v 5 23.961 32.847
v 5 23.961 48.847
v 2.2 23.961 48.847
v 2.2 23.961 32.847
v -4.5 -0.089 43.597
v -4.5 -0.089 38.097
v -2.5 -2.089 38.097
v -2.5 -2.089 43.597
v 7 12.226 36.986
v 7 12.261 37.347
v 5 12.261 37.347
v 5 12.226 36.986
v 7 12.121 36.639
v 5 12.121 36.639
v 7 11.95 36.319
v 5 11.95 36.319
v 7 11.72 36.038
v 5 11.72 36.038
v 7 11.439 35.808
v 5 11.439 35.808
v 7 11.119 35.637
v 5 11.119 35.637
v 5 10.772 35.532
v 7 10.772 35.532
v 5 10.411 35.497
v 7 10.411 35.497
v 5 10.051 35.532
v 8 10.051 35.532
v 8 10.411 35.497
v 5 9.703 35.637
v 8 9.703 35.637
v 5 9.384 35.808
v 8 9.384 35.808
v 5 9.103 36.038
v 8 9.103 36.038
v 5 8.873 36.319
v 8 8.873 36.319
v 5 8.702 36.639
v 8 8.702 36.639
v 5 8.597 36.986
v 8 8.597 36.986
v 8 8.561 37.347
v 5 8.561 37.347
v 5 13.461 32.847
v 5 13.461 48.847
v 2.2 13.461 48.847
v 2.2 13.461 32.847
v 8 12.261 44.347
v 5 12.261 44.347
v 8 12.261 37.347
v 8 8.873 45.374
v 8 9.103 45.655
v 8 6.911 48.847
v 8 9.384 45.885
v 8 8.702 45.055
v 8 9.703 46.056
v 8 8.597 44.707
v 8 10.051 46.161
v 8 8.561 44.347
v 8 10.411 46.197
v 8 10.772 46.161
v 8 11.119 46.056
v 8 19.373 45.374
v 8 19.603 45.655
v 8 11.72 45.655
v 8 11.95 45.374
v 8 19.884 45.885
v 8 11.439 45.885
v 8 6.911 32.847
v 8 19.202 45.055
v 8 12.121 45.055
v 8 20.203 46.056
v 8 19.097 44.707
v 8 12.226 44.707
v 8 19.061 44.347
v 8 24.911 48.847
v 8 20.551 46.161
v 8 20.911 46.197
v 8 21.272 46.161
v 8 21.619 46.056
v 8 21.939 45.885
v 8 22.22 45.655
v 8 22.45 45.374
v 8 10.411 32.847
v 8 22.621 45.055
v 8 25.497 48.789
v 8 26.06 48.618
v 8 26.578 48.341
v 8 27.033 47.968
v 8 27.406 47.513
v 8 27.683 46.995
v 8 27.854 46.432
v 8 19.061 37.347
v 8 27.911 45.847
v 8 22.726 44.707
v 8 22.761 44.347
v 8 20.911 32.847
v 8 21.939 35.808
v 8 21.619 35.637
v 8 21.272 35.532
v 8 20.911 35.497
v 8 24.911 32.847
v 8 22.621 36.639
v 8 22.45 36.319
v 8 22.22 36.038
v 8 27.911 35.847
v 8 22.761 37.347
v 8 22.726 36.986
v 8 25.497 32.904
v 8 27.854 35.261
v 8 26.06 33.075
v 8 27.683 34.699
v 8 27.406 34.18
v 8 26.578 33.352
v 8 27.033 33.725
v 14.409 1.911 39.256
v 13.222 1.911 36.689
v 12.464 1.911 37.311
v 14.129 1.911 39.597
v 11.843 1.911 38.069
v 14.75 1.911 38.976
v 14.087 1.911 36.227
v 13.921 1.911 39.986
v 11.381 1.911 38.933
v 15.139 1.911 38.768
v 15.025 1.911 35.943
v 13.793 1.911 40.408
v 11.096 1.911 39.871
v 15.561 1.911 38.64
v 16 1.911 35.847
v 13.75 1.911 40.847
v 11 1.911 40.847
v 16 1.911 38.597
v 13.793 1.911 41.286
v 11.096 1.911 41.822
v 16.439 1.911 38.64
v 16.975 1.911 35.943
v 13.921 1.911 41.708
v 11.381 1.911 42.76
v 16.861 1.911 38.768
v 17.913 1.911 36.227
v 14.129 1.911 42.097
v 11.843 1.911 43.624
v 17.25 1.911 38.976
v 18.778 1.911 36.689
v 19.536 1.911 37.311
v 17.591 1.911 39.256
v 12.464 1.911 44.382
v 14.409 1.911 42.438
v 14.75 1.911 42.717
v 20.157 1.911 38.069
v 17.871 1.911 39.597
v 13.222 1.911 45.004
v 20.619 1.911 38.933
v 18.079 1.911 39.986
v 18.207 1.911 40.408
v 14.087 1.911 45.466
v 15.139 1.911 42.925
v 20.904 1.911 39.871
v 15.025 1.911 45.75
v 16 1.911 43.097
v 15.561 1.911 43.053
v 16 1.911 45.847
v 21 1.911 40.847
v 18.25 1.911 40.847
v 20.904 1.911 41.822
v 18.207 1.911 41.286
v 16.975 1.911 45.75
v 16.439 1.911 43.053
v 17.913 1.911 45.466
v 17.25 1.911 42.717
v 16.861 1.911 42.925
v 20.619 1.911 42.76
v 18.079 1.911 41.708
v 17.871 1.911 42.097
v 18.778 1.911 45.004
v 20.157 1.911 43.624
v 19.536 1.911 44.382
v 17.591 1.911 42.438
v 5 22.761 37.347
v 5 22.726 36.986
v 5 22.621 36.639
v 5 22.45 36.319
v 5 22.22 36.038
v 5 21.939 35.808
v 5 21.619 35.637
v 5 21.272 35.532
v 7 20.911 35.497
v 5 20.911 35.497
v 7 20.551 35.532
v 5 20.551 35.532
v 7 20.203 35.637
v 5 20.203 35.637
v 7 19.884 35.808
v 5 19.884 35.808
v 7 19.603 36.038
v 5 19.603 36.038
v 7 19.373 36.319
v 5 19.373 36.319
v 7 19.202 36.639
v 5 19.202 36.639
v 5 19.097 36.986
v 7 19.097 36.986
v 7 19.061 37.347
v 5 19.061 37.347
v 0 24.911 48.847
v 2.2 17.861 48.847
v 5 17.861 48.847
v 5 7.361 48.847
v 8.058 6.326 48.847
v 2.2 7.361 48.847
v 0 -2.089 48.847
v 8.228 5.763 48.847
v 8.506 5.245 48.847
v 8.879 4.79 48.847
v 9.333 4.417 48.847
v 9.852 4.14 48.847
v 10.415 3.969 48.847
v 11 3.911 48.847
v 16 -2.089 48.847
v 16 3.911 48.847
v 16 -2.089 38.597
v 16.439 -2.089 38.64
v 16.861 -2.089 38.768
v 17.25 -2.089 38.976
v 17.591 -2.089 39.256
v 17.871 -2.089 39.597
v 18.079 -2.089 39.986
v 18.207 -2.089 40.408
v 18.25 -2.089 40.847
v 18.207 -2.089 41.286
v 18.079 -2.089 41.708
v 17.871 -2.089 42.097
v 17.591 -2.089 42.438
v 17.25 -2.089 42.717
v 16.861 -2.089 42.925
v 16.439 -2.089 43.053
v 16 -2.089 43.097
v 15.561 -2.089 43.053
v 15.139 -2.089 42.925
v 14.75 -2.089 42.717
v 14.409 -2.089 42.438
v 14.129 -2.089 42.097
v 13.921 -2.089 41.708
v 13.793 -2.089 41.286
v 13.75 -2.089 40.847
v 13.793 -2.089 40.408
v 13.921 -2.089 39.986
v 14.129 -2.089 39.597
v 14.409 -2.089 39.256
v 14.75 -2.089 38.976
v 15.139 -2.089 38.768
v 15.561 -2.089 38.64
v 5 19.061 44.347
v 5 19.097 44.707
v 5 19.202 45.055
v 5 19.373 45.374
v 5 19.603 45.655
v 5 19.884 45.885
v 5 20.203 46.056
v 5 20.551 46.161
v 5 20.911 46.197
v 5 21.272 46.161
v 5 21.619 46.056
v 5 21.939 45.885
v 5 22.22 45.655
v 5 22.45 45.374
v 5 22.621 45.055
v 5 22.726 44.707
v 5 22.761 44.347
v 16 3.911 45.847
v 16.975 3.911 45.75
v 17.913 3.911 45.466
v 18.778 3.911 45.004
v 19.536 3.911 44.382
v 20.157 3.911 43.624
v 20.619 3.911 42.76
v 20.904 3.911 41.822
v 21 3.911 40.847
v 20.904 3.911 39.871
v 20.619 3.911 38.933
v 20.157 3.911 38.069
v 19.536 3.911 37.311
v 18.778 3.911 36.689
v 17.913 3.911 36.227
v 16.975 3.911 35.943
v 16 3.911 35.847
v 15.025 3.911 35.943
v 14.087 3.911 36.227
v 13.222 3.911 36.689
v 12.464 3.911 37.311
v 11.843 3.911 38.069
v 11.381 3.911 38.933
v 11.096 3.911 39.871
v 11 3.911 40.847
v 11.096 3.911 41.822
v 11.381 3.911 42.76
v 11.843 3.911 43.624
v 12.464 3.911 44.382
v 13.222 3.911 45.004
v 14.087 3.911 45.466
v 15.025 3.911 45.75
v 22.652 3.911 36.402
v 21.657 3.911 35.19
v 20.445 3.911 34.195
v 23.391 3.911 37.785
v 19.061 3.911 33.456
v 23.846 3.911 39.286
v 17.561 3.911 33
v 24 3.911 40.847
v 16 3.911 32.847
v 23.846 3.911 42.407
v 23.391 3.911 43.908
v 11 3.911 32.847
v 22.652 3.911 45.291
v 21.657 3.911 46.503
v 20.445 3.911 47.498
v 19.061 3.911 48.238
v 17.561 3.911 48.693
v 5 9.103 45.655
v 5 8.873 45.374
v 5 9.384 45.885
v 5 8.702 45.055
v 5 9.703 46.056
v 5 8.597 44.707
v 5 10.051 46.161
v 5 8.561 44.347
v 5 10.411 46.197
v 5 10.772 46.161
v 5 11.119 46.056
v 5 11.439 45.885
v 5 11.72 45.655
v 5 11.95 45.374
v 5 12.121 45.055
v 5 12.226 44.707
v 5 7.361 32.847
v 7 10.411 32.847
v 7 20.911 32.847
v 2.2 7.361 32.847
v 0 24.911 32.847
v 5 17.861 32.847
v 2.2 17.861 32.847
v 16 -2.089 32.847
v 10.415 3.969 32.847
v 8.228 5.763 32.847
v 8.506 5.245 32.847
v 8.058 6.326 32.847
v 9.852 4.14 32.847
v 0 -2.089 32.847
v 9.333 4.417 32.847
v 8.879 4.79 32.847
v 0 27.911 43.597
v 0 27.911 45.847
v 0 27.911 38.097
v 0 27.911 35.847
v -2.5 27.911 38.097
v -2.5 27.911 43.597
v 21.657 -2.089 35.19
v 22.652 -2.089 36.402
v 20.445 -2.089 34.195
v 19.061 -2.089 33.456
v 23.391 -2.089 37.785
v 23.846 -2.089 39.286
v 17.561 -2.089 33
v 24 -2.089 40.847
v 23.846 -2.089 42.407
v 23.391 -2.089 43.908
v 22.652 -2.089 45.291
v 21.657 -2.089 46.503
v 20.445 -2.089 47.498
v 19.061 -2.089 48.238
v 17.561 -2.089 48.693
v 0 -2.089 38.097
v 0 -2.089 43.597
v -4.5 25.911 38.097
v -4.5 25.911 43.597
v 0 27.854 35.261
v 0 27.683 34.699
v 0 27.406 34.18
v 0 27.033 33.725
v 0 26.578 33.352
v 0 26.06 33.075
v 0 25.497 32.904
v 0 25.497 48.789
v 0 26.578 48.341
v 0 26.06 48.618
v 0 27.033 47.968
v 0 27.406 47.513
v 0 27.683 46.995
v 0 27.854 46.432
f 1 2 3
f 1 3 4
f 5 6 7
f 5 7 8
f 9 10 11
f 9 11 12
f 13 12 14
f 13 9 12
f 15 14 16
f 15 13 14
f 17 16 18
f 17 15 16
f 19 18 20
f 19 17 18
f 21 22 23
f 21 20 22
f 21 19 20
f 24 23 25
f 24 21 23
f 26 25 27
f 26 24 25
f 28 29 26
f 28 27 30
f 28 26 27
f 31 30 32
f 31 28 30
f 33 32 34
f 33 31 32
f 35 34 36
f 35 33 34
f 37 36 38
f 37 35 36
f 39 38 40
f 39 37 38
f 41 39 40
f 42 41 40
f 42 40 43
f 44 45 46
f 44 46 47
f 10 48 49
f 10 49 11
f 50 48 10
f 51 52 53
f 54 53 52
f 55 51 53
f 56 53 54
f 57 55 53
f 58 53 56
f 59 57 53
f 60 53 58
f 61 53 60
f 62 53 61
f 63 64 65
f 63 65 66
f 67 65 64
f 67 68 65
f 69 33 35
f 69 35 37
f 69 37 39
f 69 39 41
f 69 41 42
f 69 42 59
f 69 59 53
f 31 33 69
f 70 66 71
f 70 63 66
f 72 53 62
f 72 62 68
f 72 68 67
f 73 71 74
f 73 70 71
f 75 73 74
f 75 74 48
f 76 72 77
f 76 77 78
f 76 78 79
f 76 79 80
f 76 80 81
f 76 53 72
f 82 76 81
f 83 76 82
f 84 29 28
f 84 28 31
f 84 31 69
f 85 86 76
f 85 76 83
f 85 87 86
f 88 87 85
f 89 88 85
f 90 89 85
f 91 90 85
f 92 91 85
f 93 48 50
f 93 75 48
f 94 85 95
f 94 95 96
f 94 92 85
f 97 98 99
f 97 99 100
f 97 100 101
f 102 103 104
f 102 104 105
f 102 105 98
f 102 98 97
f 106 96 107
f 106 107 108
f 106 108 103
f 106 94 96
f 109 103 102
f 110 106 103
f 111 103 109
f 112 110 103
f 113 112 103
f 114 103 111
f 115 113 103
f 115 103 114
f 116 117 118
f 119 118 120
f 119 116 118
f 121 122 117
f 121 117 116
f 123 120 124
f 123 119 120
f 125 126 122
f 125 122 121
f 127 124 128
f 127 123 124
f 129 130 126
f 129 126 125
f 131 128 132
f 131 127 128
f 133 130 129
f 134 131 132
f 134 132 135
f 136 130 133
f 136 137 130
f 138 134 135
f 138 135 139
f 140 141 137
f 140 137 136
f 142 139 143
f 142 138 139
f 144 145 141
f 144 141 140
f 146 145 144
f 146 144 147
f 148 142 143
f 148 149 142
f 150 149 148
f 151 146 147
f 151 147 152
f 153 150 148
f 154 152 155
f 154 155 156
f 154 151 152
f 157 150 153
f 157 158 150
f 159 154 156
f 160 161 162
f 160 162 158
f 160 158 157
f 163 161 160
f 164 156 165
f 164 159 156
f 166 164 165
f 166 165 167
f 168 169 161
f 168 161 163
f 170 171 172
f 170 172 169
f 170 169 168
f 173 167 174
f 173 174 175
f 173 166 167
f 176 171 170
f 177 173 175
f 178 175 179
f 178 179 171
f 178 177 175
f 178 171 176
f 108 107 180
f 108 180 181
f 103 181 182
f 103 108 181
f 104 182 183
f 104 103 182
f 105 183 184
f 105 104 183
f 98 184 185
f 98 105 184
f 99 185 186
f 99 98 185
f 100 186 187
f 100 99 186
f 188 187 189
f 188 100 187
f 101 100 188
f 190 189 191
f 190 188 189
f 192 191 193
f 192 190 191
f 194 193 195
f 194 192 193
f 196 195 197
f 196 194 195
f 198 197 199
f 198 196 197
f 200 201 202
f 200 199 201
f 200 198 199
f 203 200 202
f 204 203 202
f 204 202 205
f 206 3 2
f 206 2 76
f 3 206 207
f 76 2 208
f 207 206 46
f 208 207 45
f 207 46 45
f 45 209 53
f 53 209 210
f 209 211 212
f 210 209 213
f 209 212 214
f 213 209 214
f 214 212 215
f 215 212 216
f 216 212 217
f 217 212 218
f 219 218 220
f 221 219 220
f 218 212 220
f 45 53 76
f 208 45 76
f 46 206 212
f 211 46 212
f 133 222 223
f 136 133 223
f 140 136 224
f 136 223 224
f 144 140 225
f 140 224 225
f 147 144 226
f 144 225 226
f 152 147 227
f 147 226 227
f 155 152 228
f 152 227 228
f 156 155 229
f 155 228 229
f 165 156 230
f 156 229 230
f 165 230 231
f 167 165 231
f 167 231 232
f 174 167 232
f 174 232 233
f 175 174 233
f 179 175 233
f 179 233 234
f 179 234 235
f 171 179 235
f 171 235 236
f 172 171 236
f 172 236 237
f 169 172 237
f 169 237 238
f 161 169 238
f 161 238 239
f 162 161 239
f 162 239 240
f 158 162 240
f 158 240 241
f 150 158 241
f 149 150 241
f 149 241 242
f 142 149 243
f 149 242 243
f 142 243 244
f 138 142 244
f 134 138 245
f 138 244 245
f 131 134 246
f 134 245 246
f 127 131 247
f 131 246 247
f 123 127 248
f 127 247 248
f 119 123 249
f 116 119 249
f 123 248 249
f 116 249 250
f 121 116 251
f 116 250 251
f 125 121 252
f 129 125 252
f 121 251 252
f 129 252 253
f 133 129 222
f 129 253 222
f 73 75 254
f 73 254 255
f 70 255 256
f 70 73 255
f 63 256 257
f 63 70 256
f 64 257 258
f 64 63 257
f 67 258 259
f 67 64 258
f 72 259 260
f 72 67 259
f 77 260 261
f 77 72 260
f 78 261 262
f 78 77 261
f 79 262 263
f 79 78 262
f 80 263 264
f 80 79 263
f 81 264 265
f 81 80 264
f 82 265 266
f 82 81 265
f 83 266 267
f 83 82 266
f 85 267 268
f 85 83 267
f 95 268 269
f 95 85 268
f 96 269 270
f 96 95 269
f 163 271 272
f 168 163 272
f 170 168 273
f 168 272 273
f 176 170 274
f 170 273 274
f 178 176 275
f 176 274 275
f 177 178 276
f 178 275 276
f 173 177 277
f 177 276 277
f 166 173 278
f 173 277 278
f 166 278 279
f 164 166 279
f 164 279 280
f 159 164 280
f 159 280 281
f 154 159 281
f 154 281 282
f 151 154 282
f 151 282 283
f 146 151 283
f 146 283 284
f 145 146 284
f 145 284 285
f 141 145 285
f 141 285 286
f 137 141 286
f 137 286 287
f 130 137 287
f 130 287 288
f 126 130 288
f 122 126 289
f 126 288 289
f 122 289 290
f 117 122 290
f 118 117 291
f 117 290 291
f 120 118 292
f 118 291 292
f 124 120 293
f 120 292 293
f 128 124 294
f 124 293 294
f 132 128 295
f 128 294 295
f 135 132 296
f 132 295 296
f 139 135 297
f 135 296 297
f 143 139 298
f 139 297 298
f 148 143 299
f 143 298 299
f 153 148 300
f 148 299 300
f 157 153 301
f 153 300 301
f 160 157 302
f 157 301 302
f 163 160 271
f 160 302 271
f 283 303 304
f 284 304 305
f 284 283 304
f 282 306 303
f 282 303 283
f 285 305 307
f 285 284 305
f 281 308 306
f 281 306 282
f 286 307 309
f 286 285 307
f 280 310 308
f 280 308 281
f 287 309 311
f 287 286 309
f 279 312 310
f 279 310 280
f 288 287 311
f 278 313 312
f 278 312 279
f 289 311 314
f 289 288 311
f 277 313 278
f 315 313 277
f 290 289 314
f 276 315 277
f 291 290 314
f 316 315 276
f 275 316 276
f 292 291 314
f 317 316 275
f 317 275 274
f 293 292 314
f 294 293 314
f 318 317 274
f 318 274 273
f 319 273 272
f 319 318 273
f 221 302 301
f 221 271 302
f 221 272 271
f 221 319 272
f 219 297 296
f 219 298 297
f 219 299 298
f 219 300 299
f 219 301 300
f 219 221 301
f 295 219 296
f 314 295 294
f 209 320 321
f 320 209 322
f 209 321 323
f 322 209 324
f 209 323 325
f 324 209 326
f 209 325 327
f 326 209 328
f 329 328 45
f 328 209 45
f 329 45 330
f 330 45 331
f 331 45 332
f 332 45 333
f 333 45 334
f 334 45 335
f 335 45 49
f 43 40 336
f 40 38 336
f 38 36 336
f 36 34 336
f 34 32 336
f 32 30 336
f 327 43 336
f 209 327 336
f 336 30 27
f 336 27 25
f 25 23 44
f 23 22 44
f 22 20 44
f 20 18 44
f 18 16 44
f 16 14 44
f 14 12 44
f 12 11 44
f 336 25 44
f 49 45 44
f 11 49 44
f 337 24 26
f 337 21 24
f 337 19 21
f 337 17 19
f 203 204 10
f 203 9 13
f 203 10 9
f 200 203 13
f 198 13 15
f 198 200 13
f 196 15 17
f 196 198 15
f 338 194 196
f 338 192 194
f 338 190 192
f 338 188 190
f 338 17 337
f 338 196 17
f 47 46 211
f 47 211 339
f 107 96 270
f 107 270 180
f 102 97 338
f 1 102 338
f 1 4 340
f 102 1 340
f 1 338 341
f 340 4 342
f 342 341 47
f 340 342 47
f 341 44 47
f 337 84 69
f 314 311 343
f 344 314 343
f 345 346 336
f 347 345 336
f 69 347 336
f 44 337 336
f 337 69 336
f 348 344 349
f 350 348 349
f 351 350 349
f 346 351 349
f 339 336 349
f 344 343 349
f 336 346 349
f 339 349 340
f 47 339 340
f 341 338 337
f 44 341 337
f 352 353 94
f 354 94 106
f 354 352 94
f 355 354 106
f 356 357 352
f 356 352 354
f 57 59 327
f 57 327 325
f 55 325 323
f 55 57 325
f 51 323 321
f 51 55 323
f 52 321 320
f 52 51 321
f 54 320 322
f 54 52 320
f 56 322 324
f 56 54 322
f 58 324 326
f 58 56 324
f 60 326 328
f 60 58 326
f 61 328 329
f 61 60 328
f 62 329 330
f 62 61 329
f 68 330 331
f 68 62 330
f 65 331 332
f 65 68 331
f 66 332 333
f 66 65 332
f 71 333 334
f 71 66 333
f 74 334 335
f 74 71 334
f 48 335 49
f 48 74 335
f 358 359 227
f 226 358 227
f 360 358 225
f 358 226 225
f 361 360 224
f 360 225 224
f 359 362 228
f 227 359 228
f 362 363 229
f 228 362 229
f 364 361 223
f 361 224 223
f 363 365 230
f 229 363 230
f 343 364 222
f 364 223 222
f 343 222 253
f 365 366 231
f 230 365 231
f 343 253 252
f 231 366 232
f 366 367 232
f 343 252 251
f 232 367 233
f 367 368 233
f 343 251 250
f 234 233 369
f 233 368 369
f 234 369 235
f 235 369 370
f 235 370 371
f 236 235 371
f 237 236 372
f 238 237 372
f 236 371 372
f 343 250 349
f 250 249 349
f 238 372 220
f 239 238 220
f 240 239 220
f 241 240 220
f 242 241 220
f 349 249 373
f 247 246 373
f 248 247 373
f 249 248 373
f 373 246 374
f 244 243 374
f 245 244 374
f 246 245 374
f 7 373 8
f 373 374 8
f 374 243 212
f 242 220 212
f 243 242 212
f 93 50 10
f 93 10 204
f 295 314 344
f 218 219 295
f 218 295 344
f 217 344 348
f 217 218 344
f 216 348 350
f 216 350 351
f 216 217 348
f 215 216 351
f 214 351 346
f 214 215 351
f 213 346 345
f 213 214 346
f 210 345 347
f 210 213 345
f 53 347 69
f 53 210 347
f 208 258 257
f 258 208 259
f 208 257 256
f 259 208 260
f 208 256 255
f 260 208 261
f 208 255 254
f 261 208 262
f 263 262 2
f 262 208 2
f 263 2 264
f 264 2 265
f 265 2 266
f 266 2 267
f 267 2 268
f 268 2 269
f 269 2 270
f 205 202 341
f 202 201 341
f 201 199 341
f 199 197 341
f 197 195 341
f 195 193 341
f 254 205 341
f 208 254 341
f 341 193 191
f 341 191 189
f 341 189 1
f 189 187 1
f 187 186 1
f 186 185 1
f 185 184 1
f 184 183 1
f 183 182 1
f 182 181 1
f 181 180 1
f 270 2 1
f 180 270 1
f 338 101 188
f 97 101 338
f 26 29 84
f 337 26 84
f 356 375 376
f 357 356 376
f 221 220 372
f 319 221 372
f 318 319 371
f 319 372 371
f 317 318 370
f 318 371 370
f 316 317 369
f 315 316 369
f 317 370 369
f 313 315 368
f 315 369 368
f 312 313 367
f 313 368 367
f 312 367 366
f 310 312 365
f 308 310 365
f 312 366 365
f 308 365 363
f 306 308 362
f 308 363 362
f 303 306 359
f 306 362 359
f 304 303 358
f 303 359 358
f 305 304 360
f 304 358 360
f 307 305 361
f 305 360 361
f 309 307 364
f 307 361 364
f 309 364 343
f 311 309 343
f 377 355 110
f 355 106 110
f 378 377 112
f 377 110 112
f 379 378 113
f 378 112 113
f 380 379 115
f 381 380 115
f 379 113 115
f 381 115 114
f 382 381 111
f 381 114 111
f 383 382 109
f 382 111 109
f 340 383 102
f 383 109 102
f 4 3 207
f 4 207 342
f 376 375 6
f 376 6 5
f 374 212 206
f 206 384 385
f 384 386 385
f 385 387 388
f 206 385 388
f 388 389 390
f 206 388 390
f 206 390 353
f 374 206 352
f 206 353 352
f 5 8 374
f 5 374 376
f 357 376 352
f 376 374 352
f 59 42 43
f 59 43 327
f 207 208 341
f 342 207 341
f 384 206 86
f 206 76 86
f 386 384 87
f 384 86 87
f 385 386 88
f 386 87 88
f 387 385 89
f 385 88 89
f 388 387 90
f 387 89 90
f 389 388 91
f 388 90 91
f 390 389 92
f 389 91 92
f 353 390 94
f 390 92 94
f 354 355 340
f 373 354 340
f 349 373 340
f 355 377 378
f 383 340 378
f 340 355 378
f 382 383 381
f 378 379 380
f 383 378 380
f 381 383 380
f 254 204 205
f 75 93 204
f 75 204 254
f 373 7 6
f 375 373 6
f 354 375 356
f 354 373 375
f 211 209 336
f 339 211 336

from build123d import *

# Parameters (mm, degrees)
SKETCH1_W           = 16
SKETCH1_H           = 30
BOSS_EXTRUDE1_DEPTH = 8
SKETCH2_W           = 5.5
SKETCH2_H           = 30
BOSS_EXTRUDE2_DEPTH = 4.5
CHAMFER1_SIZE       = 2
SKETCH6_R           = 2.25
BOSS_EXTRUDE3_DEPTH = 6
FILLET6_R           = 3
CUT_EXTRUDE1_START  = -3
SKETCH7_W           = 16
SKETCH7_H           = 6.1
CUT_EXTRUDE1_DEPTH  = 2.8
CUT_EXTRUDE2_DEPTH  = 5
SKETCH9_W           = 4.5
SKETCH9_H           = 10.5
CUT_EXTRUDE3_DEPTH  = 1
SKETCH10_R          = 5
CUT_EXTRUDE4_DEPTH  = 2
FILLET7_R           = 3


with BuildPart() as part:
    # Sketch1 → Boss-Extrude1 (new body)
    with BuildSketch(Plane(origin=(0, 0, 0), x_dir=(0, 0, -1), z_dir=(1, 0, 0))):
        with Locations((-40.846556001, 12.91146402)):
            Rectangle(SKETCH1_W, SKETCH1_H)
    extrude(amount=BOSS_EXTRUDE1_DEPTH)

    # Sketch2 → Boss-Extrude2 (add)
    with BuildSketch(Plane.ZY):
        with Locations((40.846556001, 12.91146402)):
            Rectangle(SKETCH2_W, SKETCH2_H)
    extrude(amount=BOSS_EXTRUDE2_DEPTH)

    # Chamfer1
    chamfer1_edges = [part.edges().sort_by_distance(p)[0] for p in [
        (-4.5, -2.08853598, 40.846556001),
        (-4.5, 27.91146402, 40.846556001),
    ]]
    chamfer(chamfer1_edges, length=CHAMFER1_SIZE)

    # Sketch6 → Boss-Extrude3 (add)
    with BuildSketch(Plane.XZ.offset(2.08853598)):
        with BuildLine():
            Line((8, 48.846556001), (16, 48.846556001))
            ThreePointArc((16, 48.846556001), (24, 40.846556001), (16, 32.846556001))
            Line((16, 32.846556001), (8, 32.846556001))
            Line((8, 32.846556001), (8, 48.846556001))
        make_face()
        with Locations(Location((16, 40.846556001, 0), (0, 0, 270))):
            Circle(SKETCH6_R, mode=Mode.SUBTRACT)
    extrude(amount=-BOSS_EXTRUDE3_DEPTH)

    # Fillet6
    fillet6_edges = [part.edges().sort_by_distance(p)[0] for p in [
        (8, 3.91146402, 40.846556001),
    ]]
    fillet(fillet6_edges, radius=FILLET6_R)

    # Sketch7 → Cut-Extrude1 (cut)
    with BuildSketch(Plane(origin=(8, 0, 0), x_dir=(0, 0, -1), z_dir=(1, 0, 0)).offset(CUT_EXTRUDE1_START)):
        with Locations((-40.846556001, 20.91146402)):
            Rectangle(SKETCH7_W, SKETCH7_H)
        with Locations((-40.846556001, 10.41146402)):
            Rectangle(SKETCH7_W, SKETCH7_H)
    extrude(amount=-CUT_EXTRUDE1_DEPTH, mode=Mode.SUBTRACT)

    # Sketch8 → Cut-Extrude2 (cut)
    with BuildSketch(Plane(origin=(8, 0, 0), x_dir=(0, 0, -1), z_dir=(1, 0, 0))):
        with BuildLine():
            Line((-44.346556001, 22.76146402), (-37.346556001, 22.76146402))
            ThreePointArc((-37.346556001, 22.76146402), (-35.496556001, 20.91146402), (-37.346556001, 19.06146402))
            Line((-37.346556001, 19.06146402), (-44.346556001, 19.06146402))
            ThreePointArc((-44.346556001, 19.06146402), (-46.196556001, 20.91146402), (-44.346556001, 22.76146402))
        make_face()
        with BuildLine():
            Line((-44.346556001, 12.26146402), (-37.346556001, 12.26146402))
            ThreePointArc((-37.346556001, 12.26146402), (-35.496556001, 10.41146402), (-37.346556001, 8.56146402))
            Line((-37.346556001, 8.56146402), (-44.346556001, 8.56146402))
            ThreePointArc((-44.346556001, 8.56146402), (-46.196556001, 10.41146402), (-44.346556001, 12.26146402))
        make_face()
    extrude(amount=-CUT_EXTRUDE2_DEPTH, mode=Mode.SUBTRACT)

    # Sketch9 → Cut-Extrude3 (cut)
    with BuildSketch(Plane(origin=(8, 0, 0), x_dir=(0, 0, -1), z_dir=(1, 0, 0))):
        with Locations((-35.096556001, 15.66146402)):
            Rectangle(SKETCH9_W, SKETCH9_H)
    extrude(amount=-CUT_EXTRUDE3_DEPTH, mode=Mode.SUBTRACT)

    # Sketch10 → Cut-Extrude4 (cut)
    with BuildSketch(Plane(origin=(0, 3.91146402, 0), x_dir=(1, 0, 0), z_dir=(0, 1, 0))):
        with Locations(Location((16, -40.846556001, 0), (0, 0, 270))):
            Circle(SKETCH10_R)
    extrude(amount=-CUT_EXTRUDE4_DEPTH, mode=Mode.SUBTRACT)

    # Fillet7
    fillet7_edges = [part.edges().sort_by_distance(p)[0] for p in [
        (4, 27.91146402, 32.846556001),
        (4, 27.91146402, 48.846556001),
    ]]
    fillet(fillet7_edges, radius=FILLET7_R)


solid = part.part
